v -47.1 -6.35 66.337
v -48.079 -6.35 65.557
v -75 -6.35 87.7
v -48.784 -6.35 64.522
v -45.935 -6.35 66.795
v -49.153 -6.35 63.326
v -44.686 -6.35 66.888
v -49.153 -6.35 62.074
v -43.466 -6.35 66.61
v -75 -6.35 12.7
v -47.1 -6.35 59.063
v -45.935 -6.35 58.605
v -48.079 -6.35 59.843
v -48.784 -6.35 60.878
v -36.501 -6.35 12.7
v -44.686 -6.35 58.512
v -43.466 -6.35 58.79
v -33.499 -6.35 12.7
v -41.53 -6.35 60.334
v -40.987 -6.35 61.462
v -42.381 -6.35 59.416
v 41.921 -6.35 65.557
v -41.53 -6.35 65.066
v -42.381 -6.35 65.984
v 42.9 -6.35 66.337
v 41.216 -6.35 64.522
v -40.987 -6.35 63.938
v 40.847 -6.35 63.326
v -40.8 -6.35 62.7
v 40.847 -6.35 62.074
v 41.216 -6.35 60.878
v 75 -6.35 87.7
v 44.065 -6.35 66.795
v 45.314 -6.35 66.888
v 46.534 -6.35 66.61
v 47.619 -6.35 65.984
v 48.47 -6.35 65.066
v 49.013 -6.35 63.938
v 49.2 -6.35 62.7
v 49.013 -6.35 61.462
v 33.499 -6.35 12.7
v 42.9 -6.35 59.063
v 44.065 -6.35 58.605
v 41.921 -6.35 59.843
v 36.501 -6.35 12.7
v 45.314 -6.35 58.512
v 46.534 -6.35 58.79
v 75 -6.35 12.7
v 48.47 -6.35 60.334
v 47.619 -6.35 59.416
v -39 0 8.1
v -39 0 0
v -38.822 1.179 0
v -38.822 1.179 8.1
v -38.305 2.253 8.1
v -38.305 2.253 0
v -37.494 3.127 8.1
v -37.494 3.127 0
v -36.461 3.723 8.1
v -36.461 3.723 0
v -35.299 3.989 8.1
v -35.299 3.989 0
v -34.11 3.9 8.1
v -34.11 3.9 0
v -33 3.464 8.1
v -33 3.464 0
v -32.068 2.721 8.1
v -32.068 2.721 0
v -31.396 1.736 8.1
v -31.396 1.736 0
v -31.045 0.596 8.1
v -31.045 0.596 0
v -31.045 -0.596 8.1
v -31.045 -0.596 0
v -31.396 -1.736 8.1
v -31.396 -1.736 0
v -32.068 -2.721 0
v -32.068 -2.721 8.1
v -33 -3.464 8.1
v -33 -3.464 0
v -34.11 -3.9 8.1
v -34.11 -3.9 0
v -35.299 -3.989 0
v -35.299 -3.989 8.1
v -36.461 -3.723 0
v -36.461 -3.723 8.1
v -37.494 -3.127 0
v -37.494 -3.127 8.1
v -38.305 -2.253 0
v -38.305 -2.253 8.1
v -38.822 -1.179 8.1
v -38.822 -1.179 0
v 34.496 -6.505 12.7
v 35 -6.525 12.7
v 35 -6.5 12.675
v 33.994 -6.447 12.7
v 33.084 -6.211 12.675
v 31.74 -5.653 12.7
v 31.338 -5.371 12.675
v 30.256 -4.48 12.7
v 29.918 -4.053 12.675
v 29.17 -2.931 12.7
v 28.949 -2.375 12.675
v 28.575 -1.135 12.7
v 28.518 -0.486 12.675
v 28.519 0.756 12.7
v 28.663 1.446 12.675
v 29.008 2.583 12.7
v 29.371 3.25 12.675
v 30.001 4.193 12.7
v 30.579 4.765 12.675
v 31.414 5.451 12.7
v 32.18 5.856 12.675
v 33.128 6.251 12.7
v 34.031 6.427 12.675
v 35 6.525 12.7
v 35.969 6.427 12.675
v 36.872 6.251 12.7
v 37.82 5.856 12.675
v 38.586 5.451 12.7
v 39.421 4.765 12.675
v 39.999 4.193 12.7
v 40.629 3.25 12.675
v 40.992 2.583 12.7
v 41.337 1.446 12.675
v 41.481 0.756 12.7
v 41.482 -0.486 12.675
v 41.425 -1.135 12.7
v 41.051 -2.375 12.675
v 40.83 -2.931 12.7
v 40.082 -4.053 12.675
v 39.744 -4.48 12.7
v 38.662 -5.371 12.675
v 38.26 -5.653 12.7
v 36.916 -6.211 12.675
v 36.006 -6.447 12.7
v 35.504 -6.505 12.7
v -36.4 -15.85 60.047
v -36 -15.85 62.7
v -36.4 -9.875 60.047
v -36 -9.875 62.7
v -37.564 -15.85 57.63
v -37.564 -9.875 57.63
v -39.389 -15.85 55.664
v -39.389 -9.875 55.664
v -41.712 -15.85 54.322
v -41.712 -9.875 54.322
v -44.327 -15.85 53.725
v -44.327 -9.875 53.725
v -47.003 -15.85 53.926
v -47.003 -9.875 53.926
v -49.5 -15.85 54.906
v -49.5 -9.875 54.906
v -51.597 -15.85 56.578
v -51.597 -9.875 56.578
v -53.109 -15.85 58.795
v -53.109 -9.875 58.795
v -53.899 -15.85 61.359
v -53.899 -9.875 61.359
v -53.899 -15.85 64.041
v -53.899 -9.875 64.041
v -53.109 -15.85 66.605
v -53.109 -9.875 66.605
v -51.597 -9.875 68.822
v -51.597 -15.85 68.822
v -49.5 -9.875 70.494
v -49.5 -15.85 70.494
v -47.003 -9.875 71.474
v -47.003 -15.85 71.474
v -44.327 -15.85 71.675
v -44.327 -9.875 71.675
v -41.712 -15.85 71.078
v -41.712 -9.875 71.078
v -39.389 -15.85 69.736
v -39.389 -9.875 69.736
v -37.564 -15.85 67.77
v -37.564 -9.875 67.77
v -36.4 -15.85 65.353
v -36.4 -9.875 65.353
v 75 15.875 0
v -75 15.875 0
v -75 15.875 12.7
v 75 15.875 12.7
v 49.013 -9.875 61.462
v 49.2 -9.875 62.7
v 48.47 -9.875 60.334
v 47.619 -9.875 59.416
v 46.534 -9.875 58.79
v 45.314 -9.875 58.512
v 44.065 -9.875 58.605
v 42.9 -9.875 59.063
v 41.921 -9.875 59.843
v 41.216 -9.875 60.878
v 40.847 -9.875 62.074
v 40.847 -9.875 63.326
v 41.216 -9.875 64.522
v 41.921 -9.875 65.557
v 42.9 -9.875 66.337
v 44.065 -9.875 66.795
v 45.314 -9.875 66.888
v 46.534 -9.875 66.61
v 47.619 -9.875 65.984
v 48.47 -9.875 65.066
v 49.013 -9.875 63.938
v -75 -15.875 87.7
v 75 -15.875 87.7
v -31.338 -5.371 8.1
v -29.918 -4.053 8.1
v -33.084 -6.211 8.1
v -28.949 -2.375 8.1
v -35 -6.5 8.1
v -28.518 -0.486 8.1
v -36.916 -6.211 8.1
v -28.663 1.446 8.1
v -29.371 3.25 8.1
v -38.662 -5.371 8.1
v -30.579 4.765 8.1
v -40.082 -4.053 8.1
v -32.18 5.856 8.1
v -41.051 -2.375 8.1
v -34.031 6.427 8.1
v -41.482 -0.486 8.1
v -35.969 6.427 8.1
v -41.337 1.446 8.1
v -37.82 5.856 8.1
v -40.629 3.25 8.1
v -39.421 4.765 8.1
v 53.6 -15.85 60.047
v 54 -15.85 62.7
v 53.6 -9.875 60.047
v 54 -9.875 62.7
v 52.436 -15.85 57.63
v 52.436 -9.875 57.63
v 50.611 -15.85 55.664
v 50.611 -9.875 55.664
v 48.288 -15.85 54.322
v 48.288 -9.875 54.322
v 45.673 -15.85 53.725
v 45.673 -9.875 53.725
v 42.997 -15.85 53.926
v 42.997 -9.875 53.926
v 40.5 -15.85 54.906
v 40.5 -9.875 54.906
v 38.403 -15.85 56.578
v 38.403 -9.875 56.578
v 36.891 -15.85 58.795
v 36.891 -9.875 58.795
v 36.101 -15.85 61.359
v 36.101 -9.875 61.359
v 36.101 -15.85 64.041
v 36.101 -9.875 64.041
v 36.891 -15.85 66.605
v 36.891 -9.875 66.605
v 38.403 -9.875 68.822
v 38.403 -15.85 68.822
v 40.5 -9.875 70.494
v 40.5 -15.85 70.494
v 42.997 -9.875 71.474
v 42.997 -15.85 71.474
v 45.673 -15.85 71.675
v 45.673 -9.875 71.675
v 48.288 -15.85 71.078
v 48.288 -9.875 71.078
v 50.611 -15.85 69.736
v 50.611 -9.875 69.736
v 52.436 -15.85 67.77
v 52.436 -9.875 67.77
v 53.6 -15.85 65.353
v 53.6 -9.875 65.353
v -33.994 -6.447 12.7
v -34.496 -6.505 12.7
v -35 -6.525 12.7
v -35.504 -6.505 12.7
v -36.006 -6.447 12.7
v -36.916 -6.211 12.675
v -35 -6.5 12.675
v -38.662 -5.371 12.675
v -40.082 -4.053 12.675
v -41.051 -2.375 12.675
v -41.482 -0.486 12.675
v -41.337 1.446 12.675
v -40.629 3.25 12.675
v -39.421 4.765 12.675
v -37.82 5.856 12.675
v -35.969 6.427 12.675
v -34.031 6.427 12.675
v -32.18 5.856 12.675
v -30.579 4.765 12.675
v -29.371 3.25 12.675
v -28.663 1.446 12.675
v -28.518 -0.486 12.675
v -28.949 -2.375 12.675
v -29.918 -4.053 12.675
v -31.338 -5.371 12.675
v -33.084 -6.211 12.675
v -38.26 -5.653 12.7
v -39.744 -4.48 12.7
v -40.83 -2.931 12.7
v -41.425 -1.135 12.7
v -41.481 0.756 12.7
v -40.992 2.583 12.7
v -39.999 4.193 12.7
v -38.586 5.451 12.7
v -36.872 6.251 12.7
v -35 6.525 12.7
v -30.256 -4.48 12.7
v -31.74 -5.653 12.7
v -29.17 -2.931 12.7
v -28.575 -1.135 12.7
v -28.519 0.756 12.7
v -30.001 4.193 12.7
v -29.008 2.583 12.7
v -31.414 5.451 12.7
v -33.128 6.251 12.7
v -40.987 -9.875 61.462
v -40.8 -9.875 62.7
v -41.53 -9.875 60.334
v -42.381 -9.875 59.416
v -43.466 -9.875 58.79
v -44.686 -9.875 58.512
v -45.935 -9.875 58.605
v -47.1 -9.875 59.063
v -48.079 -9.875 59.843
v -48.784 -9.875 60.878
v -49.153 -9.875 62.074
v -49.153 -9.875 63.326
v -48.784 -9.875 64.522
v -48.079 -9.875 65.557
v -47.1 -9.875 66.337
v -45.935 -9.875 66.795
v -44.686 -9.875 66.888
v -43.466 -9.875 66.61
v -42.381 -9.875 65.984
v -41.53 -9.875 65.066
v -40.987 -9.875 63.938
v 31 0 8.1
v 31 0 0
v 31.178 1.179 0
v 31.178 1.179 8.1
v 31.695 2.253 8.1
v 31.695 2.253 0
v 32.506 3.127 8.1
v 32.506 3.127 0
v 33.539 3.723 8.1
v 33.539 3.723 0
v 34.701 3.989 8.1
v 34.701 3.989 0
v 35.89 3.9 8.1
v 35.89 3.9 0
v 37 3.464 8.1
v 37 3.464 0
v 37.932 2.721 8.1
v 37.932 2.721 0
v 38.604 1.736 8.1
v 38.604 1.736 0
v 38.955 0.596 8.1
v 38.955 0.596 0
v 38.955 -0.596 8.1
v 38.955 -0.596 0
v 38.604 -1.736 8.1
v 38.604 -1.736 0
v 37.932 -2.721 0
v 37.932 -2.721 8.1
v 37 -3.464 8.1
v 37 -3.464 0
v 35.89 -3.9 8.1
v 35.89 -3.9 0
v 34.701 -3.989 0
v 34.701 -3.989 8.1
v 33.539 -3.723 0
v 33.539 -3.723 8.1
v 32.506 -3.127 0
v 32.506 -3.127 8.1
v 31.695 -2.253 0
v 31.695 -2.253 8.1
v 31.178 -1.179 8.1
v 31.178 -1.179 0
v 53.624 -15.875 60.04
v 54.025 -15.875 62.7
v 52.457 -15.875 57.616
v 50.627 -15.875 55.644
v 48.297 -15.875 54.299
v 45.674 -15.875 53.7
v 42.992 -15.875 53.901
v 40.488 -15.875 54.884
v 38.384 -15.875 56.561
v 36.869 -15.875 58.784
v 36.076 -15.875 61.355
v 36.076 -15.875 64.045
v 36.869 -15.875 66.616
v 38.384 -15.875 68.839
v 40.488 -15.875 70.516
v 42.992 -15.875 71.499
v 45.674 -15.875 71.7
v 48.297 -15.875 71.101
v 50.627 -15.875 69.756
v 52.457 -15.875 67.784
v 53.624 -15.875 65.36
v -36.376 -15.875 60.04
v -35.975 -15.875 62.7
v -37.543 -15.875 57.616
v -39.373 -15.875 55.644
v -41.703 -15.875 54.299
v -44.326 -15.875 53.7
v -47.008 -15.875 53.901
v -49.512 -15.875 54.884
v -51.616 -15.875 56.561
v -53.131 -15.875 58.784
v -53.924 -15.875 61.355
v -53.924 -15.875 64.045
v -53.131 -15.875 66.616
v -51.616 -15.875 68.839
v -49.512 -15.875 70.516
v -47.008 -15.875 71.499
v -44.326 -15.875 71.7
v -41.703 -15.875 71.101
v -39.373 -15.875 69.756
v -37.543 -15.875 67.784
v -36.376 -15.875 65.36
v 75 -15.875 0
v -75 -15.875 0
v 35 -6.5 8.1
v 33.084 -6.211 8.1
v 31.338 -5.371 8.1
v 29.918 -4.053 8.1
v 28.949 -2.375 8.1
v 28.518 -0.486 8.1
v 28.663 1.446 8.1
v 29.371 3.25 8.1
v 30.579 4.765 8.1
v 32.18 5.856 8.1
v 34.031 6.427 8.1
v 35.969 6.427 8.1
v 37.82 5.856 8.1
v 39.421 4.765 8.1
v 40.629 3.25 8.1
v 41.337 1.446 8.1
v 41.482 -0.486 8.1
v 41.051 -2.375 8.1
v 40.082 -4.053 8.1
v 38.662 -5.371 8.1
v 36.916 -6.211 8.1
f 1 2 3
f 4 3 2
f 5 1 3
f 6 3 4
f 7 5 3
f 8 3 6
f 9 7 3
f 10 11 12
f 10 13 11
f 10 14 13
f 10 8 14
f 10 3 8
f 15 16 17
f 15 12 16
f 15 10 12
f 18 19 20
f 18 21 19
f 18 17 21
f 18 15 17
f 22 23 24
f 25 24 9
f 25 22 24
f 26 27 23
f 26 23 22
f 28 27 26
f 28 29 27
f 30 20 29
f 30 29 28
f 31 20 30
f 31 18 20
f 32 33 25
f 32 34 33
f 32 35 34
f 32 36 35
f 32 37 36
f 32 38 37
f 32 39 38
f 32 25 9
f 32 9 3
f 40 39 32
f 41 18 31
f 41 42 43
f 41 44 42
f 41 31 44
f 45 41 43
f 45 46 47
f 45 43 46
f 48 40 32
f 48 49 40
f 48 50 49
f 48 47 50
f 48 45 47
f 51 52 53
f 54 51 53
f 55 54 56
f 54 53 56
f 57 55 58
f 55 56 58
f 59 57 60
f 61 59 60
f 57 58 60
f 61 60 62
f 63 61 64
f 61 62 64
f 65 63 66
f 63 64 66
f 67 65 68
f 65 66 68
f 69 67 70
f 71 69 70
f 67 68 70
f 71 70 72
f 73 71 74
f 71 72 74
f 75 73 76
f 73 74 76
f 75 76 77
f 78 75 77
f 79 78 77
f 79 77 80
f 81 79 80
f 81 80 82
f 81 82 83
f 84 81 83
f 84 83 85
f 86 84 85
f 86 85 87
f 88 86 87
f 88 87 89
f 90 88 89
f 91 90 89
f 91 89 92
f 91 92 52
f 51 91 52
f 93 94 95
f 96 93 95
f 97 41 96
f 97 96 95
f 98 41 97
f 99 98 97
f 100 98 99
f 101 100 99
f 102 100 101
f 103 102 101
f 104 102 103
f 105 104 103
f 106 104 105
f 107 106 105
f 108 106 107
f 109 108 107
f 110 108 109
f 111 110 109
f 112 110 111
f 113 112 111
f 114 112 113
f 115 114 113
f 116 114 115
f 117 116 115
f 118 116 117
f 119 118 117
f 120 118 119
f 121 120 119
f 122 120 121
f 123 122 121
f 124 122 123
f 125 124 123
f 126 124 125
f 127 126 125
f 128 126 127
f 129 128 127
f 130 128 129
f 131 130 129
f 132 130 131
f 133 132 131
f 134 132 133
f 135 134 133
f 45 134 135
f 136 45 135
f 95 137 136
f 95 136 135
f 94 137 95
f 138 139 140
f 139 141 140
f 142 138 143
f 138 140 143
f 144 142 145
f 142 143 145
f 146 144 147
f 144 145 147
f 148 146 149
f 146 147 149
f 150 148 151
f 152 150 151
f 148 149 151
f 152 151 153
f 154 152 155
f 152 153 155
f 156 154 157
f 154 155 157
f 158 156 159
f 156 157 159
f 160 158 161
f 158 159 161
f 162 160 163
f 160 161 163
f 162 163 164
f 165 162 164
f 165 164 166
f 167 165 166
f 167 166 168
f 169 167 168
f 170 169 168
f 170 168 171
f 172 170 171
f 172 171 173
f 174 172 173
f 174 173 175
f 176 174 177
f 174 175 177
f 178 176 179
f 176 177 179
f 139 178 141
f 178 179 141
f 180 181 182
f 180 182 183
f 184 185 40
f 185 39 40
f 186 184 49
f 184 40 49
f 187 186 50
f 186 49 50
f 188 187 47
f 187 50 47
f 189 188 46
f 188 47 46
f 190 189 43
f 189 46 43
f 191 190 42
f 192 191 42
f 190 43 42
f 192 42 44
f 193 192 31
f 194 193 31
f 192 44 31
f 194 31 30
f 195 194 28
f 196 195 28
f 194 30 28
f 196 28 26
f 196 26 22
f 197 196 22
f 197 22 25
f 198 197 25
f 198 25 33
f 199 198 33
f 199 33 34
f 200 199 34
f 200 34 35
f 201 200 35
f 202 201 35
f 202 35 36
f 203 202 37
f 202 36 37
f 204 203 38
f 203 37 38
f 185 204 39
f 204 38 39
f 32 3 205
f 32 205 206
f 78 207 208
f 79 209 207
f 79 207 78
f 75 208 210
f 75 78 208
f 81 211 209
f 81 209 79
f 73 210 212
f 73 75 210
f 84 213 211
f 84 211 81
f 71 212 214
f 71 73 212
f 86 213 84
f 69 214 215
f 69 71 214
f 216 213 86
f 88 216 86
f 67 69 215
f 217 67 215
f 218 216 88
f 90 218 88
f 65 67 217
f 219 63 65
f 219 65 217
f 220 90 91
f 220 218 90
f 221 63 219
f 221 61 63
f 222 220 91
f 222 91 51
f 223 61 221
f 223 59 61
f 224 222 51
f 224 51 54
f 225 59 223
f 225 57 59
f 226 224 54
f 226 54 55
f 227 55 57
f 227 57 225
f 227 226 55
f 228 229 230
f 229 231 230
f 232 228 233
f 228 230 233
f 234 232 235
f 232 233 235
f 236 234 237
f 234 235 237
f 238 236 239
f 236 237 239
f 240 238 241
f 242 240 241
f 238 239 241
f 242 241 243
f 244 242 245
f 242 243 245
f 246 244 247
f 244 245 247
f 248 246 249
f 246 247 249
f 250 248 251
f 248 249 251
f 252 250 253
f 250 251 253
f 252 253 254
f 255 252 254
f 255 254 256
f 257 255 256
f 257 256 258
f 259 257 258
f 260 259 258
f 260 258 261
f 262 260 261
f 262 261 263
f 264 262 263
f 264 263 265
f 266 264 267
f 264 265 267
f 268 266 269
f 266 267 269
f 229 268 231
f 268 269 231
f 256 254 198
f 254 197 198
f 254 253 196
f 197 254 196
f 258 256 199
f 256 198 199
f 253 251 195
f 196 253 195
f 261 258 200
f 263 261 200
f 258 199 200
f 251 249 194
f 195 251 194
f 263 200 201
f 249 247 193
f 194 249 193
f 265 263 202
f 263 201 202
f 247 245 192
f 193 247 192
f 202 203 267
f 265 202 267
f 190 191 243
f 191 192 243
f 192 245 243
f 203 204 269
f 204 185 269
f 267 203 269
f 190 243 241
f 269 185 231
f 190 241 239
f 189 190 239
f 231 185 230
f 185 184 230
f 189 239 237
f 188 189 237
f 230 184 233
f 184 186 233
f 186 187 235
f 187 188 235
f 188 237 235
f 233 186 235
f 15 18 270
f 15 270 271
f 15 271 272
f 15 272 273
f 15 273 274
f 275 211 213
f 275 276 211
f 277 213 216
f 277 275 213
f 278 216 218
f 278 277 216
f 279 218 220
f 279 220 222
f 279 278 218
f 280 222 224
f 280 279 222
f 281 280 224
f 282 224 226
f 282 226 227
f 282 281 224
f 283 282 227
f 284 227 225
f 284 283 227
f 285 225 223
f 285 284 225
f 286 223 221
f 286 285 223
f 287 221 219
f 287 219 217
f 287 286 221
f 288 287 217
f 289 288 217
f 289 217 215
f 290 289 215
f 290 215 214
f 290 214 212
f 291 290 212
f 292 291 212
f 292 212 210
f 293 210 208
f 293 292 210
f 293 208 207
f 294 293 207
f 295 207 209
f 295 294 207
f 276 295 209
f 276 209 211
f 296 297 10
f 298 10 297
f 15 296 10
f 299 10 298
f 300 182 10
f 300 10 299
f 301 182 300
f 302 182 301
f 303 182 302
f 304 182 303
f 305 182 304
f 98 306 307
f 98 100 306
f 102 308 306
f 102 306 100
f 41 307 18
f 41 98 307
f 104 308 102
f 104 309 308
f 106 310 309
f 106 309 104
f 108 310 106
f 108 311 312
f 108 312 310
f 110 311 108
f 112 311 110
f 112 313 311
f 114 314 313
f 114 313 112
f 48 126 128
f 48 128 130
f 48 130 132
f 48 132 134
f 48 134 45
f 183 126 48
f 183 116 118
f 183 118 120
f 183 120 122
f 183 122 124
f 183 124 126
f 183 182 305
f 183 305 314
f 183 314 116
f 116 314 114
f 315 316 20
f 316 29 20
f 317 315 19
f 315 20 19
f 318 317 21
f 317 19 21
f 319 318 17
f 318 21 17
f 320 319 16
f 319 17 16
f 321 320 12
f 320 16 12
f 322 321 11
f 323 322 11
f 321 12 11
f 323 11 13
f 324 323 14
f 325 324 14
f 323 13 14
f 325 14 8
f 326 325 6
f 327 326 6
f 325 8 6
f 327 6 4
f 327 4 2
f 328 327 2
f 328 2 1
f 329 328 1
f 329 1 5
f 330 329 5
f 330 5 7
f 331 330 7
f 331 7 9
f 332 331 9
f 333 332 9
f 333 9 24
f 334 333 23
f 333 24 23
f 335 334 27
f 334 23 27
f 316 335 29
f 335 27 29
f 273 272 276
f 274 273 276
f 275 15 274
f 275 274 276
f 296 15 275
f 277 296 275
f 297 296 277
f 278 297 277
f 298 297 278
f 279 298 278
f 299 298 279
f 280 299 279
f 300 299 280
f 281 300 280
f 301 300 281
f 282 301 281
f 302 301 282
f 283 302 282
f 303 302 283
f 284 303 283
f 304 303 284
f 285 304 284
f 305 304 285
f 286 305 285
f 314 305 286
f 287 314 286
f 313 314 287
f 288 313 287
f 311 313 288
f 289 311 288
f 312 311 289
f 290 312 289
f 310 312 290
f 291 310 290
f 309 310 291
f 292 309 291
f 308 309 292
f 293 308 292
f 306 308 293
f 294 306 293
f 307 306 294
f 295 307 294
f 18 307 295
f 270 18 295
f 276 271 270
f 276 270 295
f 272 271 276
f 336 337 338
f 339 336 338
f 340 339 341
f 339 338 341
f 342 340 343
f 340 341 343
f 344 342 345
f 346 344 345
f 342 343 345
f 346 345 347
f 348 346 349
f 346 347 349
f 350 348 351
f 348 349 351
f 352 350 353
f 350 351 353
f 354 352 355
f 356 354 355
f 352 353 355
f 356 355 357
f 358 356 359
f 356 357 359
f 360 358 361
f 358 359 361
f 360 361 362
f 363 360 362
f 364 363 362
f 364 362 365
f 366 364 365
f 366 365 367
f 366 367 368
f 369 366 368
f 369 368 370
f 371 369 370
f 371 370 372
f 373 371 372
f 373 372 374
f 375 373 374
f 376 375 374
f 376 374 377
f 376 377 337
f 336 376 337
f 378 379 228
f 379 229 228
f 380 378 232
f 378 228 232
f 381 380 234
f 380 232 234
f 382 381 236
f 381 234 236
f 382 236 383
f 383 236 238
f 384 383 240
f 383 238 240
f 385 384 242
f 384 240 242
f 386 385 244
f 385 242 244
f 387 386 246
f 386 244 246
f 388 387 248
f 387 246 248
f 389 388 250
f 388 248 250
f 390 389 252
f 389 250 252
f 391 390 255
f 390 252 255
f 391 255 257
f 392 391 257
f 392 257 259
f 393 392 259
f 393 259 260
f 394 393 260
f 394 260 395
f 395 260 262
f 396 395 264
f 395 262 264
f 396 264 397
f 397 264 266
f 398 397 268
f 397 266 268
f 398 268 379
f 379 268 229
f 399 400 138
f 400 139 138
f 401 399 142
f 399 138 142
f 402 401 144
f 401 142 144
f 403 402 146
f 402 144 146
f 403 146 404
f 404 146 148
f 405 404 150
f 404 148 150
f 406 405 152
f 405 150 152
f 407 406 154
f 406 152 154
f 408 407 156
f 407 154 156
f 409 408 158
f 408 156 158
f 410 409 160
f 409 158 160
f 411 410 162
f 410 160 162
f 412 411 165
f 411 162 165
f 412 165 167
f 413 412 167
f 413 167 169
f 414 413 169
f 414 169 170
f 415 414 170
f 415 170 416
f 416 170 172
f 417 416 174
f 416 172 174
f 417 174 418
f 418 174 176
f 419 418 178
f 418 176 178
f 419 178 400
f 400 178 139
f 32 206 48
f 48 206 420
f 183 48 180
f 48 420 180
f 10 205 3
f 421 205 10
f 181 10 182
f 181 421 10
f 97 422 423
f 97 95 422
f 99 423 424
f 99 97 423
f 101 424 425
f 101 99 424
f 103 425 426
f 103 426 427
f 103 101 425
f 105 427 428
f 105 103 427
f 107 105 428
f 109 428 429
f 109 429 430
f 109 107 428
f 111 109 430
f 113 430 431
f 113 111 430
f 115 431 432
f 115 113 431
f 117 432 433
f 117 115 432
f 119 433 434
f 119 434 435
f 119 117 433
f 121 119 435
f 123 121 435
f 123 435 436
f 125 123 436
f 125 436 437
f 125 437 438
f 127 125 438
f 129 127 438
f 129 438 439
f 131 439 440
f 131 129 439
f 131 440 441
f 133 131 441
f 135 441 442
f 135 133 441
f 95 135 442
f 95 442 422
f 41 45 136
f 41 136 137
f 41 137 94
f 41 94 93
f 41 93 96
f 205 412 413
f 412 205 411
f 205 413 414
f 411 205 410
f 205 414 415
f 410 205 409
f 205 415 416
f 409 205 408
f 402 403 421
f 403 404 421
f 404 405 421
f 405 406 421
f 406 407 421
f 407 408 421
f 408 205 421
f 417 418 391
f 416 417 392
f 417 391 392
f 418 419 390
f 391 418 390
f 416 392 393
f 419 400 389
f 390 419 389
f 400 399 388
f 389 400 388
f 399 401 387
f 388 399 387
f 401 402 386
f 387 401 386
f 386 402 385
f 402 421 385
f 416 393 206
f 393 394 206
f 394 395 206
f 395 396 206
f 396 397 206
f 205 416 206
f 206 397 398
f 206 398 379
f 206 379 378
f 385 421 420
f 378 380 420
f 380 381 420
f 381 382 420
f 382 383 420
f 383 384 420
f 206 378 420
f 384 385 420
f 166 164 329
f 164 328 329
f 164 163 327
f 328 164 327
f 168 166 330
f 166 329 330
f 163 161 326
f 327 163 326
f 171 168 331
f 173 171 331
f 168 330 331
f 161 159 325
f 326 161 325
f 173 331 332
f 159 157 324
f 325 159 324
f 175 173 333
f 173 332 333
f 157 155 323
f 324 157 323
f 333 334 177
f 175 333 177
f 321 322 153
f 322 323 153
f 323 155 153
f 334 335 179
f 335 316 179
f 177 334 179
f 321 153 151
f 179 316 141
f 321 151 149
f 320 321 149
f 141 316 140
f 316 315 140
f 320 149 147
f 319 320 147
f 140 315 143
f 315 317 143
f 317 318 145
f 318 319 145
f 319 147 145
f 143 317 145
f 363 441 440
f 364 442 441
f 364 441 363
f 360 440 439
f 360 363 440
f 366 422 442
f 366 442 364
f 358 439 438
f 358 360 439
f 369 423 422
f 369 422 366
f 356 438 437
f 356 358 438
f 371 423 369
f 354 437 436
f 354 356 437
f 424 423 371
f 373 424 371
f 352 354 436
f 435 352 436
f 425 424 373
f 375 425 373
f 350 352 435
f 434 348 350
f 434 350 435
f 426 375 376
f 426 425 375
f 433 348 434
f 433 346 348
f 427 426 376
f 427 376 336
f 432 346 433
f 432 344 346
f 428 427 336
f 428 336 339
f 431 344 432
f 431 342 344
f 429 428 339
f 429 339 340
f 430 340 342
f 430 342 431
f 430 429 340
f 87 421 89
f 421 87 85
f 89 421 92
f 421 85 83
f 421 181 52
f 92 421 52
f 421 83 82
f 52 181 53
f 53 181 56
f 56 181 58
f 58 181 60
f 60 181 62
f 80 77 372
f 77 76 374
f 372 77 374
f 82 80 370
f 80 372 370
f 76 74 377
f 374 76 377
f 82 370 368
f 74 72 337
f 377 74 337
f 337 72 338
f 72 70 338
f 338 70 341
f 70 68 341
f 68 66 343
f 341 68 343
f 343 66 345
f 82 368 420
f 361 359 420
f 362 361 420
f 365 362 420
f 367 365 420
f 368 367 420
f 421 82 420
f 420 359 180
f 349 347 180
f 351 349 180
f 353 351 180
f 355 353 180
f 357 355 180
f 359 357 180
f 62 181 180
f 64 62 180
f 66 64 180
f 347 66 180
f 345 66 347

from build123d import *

# Parameters (mm, degrees)
ESBO_O1_W                                    = 150
ESBO_O1_H                                    = 31.75
RESSALTO_EXTRUS_O1_DEPTH                     = 12.7
ESBO_O2_W                                    = 150
ESBO_O2_H                                    = 9.525
RESSALTO_EXTRUS_O2_DEPTH                     = 75
ESBO_O4_R                                    = 4
CORTE_EXTRUS_O1_DEPTH                        = 117.483070122
REBAIXO_PARA_PARAFUSO_COM_CABE_A_PAN_2_COUNT = 2
REBAIXO_PARA_PARAFUSO_COM_CABE_A_PAN_2_PITCH = 70
ESBO_O7_R                                    = 3
CORTE_EXTRUS_O2_DEPTH                        = 9.525


# Read off the part's stored shape, not the designer's step: Rebaixo para parafuso com cabeça panela de M81
with BuildPart() as part:
    # Esboço1 → Ressalto-extrusão1 (new body)
    with BuildSketch(Plane.XY):
        Rectangle(ESBO_O1_W, ESBO_O1_H)
    extrude(amount=RESSALTO_EXTRUS_O1_DEPTH)

    # Esboço2 → Ressalto-extrusão2 (add)
    with BuildSketch(Plane.XY.offset(12.7)):
        with Locations((0, -11.1125)):
            Rectangle(ESBO_O2_W, ESBO_O2_H)
    extrude(amount=RESSALTO_EXTRUS_O2_DEPTH)

    # Esboço4 → Corte-extrusão1 (cut, through all)
    with BuildSketch(Plane(origin=(0, 0, 0), x_dir=(-1, 0, 0), z_dir=(0, 0, -1))):
        with Locations((-35, 0)):
            Circle(ESBO_O4_R)
        with Locations((35, 0)):
            Circle(ESBO_O4_R)
    extrude(amount=-CORTE_EXTRUS_O1_DEPTH, mode=Mode.SUBTRACT)

    # Esboço6 → Rebaixo para parafuso com cabe_a panela (revolve, cut)
    with BuildSketch(Plane(origin=(-35, 0, 12.7), x_dir=(0, -1, 0), z_dir=(1, 0, 0))):
        Polygon((0, 0), (0, 12.7), (3.3, 12.7), (3.3, 4.6), (6.5, 4.6), (6.5, 0.025), (6.525, 0), align=None)
    rebaixo_para_parafuso_com_cabe_a_panela = revolve(axis=Axis((-35, 0, 19.05), (0, 0, -1)), mode=Mode.SUBTRACT)

    # Rebaixo para parafuso com cabe_a pan 2: Rebaixo para parafuso com cabe_a panela ×2
    with Locations(*[(i * REBAIXO_PARA_PARAFUSO_COM_CABE_A_PAN_2_PITCH, 0, 0) for i in range(1, REBAIXO_PARA_PARAFUSO_COM_CABE_A_PAN_2_COUNT)]):
        add(rebaixo_para_parafuso_com_cabe_a_panela, mode=Mode.SUBTRACT)

    # Esboço7 → Corte-extrusão2 (cut)
    with BuildSketch(Plane.XZ.offset(15.875)):
        with Locations((-45, 62.7)):
            Circle(ESBO_O7_R)
        with Locations((45, 62.7)):
            Circle(ESBO_O7_R)
    extrude(amount=-CORTE_EXTRUS_O2_DEPTH, mode=Mode.SUBTRACT)

    # Rebaixo para parafuso com cabe_a pan 3 o → Rebaixo para parafuso com cabe_a pan 3 (revolve, cut)
    with BuildSketch(Plane(origin=(45, 0, 62.7), x_dir=(1, 0, 0), z_dir=(0, 0, 1))):
        Polygon((4.2, -9.875), (4.2, -6.35), (3, -6.35), (3, -15.875), (9.025, -15.875), (9, -15.85), (9, -9.875), align=None)
    revolve(axis=Axis((45, 0, 62.7), (0, 1, 0)), mode=Mode.SUBTRACT)

    # Rebaixo para parafuso com cabe_a pan 4 → Rebaixo para parafuso com cabe_a pan 3 2 (revolve, cut)
    with BuildSketch(Plane(origin=(-45, 0, 62.7), x_dir=(1, 0, 0), z_dir=(0, 0, 1))):
        Polygon((3, -15.875), (9.025, -15.875), (9, -15.85), (9, -9.875), (4.2, -9.875), (4.2, -6.35), (3, -6.35), align=None)
    revolve(axis=Axis((-45, 0, 62.7), (0, 1, 0)), mode=Mode.SUBTRACT)


solid = part.part
